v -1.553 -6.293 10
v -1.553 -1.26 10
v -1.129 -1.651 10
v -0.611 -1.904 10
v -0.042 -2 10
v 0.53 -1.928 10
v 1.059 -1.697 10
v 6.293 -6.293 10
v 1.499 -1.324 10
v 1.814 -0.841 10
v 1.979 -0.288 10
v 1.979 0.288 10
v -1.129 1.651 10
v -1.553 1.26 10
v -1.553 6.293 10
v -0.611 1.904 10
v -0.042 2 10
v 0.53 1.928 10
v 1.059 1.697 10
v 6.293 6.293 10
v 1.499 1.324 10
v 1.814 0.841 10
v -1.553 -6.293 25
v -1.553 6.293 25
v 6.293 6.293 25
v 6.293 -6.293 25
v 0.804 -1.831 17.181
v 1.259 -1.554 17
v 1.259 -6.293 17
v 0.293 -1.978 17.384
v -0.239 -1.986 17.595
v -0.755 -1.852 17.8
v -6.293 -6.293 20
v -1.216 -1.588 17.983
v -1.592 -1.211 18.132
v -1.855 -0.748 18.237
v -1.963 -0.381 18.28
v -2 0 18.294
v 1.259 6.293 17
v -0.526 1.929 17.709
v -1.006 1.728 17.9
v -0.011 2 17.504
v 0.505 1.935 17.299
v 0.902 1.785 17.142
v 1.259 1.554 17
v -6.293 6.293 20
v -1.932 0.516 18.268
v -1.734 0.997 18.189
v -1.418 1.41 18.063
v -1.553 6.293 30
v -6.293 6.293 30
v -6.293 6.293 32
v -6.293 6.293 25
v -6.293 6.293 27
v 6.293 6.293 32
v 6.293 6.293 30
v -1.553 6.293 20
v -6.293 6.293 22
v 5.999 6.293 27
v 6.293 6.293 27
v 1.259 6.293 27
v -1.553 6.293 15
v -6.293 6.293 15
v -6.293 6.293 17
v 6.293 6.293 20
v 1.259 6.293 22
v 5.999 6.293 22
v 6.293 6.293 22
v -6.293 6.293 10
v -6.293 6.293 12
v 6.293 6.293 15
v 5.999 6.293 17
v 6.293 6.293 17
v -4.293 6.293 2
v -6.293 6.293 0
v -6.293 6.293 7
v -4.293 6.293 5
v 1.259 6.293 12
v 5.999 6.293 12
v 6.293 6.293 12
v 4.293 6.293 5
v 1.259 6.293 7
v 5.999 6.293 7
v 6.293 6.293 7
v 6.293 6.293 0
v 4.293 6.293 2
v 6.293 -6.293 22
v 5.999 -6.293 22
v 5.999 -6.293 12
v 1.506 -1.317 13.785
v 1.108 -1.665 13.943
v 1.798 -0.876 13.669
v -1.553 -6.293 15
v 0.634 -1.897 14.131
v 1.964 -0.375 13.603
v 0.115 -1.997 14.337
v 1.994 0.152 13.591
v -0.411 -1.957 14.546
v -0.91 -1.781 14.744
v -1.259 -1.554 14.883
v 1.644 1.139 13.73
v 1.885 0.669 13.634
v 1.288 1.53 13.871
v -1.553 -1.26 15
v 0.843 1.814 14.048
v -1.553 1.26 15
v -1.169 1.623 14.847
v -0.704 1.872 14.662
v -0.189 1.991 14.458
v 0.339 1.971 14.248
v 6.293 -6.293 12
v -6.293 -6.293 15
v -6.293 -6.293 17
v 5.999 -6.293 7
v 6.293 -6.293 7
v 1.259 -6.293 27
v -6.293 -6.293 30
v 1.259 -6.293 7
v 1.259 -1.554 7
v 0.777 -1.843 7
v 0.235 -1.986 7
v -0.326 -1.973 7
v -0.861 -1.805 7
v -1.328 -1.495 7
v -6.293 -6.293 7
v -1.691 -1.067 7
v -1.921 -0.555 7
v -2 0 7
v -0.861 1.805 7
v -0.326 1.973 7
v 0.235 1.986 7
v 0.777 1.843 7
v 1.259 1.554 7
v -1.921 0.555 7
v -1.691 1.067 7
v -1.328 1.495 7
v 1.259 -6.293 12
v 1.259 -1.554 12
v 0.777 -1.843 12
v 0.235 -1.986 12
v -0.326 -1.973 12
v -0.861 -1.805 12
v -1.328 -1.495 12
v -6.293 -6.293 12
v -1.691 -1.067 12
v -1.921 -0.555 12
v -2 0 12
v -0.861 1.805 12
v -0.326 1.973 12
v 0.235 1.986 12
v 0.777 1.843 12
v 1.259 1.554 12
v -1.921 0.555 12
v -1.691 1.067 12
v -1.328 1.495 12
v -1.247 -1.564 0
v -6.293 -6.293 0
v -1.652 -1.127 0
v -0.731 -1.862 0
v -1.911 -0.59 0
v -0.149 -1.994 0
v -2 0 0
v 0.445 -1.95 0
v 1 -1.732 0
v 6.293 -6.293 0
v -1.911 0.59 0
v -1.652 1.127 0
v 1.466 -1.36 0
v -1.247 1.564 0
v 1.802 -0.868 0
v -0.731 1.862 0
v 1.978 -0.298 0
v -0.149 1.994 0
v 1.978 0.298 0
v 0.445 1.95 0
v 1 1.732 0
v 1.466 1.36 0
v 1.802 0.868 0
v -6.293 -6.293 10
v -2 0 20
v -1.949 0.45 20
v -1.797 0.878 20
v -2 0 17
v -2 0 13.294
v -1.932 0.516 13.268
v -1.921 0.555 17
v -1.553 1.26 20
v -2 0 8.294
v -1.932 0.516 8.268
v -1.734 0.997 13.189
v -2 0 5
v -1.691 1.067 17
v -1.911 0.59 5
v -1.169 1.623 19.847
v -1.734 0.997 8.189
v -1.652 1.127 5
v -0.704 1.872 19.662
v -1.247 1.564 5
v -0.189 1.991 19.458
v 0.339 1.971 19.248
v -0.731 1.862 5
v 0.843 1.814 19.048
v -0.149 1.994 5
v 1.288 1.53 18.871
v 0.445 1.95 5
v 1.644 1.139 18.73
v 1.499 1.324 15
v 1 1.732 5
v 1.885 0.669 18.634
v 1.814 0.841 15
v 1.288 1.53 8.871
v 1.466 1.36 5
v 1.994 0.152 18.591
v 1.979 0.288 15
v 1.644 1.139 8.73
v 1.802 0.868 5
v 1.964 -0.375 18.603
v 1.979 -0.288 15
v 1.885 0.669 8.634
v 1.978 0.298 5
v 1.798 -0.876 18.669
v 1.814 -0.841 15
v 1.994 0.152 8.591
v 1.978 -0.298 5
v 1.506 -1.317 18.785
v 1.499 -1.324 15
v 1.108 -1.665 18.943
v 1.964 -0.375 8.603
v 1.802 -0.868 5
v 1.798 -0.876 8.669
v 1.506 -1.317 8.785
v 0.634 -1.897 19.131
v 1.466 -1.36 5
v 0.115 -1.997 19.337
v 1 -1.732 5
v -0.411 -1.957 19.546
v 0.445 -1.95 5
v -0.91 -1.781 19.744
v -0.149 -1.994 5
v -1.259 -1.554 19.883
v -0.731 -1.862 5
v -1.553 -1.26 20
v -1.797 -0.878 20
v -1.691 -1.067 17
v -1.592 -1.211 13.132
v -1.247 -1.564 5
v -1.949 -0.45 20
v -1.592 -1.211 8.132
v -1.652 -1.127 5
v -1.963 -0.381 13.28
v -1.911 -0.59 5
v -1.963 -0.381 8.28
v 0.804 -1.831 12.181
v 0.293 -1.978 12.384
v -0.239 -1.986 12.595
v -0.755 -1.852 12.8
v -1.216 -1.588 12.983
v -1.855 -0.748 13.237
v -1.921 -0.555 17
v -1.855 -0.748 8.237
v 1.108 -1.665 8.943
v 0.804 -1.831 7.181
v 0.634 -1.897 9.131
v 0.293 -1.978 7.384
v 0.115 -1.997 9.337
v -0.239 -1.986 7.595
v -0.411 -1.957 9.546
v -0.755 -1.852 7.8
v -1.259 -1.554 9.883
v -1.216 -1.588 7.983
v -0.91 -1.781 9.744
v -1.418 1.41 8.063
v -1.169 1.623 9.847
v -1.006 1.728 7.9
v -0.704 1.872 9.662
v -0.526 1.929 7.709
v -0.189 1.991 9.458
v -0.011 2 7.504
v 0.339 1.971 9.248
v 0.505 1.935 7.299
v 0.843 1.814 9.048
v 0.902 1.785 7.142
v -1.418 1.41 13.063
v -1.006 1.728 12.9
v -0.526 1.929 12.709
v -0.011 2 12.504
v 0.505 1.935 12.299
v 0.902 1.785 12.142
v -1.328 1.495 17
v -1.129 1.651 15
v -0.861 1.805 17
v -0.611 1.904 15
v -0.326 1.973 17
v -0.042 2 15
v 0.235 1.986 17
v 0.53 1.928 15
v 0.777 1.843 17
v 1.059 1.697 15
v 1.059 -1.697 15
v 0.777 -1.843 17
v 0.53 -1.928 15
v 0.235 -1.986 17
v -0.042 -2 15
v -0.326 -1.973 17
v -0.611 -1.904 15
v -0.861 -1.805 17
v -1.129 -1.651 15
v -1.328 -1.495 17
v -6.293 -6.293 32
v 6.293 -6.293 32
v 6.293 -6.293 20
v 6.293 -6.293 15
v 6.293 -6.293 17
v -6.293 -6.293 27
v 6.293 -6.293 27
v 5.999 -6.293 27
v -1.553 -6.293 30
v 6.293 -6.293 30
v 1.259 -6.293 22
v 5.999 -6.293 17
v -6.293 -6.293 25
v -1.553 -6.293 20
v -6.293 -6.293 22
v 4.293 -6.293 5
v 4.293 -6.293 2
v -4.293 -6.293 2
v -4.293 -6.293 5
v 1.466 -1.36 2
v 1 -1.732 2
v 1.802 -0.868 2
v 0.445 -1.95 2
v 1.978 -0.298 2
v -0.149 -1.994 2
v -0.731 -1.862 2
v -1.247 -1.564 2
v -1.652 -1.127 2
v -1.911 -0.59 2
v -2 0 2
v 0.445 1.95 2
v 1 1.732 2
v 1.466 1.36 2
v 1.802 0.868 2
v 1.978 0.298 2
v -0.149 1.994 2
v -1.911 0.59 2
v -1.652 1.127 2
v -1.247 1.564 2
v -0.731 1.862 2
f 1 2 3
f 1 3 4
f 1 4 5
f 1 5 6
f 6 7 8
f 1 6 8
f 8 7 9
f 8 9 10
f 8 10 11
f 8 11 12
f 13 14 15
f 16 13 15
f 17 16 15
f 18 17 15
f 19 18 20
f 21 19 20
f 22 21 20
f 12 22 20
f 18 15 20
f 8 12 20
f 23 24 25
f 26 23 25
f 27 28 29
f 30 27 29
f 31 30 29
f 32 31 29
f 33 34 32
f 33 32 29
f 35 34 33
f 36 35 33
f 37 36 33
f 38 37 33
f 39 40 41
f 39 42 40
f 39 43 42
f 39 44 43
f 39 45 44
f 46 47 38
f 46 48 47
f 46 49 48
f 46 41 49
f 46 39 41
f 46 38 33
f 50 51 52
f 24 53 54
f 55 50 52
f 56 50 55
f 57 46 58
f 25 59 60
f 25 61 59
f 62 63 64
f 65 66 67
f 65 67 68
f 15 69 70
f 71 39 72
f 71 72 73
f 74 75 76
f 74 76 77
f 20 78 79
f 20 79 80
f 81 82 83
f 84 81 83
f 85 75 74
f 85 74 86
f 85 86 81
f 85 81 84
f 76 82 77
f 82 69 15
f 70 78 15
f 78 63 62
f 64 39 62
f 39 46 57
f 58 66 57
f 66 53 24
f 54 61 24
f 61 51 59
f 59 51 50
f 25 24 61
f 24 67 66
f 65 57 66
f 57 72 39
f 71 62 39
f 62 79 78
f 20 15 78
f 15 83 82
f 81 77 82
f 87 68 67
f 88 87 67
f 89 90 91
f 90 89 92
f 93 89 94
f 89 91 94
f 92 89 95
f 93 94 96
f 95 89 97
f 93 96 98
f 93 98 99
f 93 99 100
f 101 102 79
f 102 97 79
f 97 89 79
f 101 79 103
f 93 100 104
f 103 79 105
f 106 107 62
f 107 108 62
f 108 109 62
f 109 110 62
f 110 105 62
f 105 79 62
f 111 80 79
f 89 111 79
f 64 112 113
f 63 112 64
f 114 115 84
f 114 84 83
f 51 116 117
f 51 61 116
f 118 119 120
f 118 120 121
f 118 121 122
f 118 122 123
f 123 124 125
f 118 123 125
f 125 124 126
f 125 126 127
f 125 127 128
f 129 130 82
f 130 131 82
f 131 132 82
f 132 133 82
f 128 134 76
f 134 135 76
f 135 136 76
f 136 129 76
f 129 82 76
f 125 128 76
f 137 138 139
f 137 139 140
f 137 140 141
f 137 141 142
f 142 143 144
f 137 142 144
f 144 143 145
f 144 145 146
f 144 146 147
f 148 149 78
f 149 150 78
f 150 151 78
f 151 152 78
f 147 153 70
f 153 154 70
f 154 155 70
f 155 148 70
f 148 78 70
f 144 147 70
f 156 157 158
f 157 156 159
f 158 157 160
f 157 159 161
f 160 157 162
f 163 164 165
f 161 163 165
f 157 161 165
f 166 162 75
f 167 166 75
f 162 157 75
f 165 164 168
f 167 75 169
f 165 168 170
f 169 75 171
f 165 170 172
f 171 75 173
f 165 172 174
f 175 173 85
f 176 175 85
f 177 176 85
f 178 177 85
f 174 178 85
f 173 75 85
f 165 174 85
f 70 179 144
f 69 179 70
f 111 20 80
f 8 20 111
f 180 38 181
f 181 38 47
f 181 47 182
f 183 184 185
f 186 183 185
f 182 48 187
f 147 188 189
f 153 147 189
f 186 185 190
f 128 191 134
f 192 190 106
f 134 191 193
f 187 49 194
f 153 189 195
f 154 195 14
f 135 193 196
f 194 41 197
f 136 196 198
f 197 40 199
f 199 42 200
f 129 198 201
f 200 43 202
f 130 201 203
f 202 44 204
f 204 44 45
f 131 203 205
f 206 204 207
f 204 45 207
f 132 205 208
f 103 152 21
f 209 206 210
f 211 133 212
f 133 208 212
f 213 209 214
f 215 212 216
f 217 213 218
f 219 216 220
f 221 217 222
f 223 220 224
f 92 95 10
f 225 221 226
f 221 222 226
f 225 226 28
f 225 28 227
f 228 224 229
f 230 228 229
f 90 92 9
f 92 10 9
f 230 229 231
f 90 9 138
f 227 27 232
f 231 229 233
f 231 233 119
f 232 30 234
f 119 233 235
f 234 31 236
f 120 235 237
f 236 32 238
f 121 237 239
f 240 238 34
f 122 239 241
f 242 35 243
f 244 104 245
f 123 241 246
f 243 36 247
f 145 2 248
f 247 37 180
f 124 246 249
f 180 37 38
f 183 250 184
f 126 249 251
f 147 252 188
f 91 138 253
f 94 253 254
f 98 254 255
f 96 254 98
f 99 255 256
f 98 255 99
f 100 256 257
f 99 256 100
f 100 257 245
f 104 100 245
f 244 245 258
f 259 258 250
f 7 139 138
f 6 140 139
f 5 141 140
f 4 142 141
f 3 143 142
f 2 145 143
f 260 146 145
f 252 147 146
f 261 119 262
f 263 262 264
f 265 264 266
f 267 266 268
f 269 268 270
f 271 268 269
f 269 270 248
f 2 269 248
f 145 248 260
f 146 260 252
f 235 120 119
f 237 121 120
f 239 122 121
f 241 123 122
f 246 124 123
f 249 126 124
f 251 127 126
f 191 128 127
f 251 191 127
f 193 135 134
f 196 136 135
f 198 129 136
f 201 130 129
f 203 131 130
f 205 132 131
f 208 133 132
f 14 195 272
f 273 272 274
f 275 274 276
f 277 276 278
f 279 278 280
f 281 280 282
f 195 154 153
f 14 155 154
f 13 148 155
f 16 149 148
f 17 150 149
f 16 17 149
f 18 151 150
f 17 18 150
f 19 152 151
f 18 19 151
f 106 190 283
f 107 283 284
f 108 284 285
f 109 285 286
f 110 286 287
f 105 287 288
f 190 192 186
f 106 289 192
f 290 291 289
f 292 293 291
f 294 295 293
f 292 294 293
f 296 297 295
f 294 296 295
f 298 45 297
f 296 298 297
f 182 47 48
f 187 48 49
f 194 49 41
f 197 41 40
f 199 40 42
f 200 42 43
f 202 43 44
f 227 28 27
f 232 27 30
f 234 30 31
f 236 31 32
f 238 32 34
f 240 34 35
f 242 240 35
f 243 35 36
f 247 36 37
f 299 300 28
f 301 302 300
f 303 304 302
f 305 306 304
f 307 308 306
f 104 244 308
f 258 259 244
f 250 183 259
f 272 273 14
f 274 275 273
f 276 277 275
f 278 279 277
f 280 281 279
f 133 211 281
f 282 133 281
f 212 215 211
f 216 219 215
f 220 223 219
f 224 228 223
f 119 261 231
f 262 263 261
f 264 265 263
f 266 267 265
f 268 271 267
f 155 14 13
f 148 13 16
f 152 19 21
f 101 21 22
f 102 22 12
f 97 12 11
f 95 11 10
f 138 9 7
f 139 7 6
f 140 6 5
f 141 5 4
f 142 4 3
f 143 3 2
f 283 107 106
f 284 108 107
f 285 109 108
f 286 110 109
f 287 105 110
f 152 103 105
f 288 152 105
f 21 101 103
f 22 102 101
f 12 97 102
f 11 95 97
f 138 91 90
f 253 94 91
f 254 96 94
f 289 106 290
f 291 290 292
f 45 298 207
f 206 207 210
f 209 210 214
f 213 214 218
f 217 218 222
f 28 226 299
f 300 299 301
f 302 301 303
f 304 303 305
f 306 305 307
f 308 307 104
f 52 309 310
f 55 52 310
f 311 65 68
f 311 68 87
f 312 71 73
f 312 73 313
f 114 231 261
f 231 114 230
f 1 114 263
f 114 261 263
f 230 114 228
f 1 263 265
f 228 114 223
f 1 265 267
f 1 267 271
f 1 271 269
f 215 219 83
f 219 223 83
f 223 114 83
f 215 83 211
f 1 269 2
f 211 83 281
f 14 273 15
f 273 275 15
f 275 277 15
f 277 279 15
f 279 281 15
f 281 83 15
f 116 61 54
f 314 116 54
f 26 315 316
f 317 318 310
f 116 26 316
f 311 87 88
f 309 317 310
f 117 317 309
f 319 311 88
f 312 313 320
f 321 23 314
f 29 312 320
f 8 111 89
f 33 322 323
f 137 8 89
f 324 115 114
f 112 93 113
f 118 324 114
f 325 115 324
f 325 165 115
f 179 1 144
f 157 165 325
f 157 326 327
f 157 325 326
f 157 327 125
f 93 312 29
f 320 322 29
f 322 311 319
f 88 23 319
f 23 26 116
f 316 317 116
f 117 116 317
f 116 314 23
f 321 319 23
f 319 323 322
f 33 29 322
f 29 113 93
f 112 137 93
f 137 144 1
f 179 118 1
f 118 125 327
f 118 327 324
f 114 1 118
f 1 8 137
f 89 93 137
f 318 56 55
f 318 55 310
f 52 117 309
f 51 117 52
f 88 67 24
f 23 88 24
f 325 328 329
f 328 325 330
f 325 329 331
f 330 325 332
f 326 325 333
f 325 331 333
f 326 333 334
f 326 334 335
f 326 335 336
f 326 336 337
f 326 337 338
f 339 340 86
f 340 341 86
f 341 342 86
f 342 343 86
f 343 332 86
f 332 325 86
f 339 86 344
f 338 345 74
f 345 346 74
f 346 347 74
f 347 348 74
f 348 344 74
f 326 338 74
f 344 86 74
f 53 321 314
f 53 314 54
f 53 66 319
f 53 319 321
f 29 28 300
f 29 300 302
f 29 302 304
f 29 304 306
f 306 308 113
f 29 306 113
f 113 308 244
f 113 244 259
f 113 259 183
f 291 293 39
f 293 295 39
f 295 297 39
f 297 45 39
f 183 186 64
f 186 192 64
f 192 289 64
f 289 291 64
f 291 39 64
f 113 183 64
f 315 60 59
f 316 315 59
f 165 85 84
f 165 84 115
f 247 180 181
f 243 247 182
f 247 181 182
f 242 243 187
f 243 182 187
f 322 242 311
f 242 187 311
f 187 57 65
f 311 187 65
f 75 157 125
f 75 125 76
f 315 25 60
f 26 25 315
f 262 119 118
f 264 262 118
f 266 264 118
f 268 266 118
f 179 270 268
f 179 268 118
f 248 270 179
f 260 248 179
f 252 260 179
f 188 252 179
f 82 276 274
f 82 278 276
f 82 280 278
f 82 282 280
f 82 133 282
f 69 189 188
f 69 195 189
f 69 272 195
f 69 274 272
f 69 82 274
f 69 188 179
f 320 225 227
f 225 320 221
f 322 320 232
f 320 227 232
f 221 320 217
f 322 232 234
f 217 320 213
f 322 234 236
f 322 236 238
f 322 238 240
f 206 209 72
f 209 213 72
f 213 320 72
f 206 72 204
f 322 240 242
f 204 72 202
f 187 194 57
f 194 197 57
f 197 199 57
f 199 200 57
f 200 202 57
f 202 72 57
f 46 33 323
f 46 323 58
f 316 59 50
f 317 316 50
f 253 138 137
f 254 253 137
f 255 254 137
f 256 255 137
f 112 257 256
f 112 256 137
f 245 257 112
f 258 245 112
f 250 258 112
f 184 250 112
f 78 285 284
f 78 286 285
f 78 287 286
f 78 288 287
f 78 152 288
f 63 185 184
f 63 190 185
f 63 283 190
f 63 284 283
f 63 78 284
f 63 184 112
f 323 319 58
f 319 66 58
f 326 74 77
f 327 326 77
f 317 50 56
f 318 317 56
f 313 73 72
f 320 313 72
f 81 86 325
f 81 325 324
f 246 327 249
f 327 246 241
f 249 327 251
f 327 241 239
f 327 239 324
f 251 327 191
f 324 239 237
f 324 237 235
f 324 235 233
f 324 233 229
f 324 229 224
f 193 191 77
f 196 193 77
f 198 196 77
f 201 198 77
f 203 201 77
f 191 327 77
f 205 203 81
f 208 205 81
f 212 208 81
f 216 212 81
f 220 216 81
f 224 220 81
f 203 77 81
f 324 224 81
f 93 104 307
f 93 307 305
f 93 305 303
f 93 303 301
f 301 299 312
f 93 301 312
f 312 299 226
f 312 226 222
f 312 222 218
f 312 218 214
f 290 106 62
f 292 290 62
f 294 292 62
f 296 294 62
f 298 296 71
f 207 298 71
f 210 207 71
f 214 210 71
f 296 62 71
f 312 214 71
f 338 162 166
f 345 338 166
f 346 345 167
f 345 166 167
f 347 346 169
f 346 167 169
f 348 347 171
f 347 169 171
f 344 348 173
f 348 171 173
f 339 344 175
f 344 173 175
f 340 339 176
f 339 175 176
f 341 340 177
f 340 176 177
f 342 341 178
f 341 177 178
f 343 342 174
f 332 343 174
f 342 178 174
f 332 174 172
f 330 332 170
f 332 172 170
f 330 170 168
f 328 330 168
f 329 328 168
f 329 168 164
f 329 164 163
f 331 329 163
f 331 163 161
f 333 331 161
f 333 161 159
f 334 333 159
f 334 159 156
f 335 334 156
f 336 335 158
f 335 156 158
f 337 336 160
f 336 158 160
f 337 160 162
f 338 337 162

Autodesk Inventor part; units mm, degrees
ref_plane "YZ Plane" through (0, 0, 0) normal (1, 0, 0) x (0, 1, 0)
ref_plane "XZ Plane" through (0, 0, 0) normal (0, 1, 0) x (-1, 0, 0)
ref_plane "XY Plane" through (0, 0, 0) normal (0, 0, 1) x (1, 0, 0)
sketch "Boceto1" plane through (0, 0, 0) normal (0, 0, 1) x (1, 0, 0)
  circle A0 centre (0, 0) radius 8.9
  line L0 (6.2933, -6.2933) -> (-6.2933, -6.2933)
  line L1 (-6.2933, -6.2933) -> (-6.2933, 6.2933)
  line L2 (-6.2933, 6.2933) -> (6.2933, 6.2933)
  line L3 (6.2933, 6.2933) -> (6.2933, -6.2933)
  dimension "d0" = 17.8
  dimension "d1" = 12.5865
  dimension "d2" = 12.5865
extrude "Extrusión1" add sketch "Boceto1" along normal blind 32 contours L3 L0 L1 L2
sketch "Boceto2" plane through (0, 0, 0) normal (0, 1, 0) x (-1, 0, 0)
  line L0 (6.2933, 0) -> (-6.2933, 0)
  line L1 (-6.2933, 0) -> (-6.2933, 2)
  line L2 (-6.2933, 2) -> (6.2933, 2)
  line L3 (6.2933, 2) -> (6.2933, 0)
  line L4 (6.2933, 5) -> (-6.2933, 5)
  line L5 (-6.2933, 5) -> (-6.2933, 7)
  line L6 (-6.2933, 7) -> (6.2933, 7)
  line L7 (6.2933, 7) -> (6.2933, 5)
  line L8 (6.2933, 10) -> (-6.2933, 10)
  line L9 (-6.2933, 10) -> (-6.2933, 12)
  line L10 (-6.2933, 12) -> (6.2933, 12)
  line L11 (6.2933, 12) -> (6.2933, 10)
  line L12 (6.2933, 15) -> (-6.2933, 15)
  line L13 (-6.2933, 15) -> (-6.2933, 17)
  line L14 (-6.2933, 17) -> (6.2933, 17)
  line L15 (6.2933, 17) -> (6.2933, 15)
  line L16 (6.2933, 20) -> (-6.2933, 20)
  line L17 (-6.2933, 20) -> (-6.2933, 22)
  line L18 (-6.2933, 22) -> (6.2933, 22)
  line L19 (6.2933, 22) -> (6.2933, 20)
  line L20 (6.2933, 25) -> (-6.2933, 25)
  line L21 (-6.2933, 25) -> (-6.2933, 27)
  line L22 (-6.2933, 27) -> (6.2933, 27)
  line L23 (6.2933, 27) -> (6.2933, 25)
  line L24 (6.2933, 30) -> (-6.2933, 30)
  line L25 (-6.2933, 30) -> (-6.2933, 32)
  line L26 (-6.2933, 32) -> (6.2933, 32)
  line L27 (6.2933, 32) -> (6.2933, 30)
  line L28 (-6.2933, 0) -> (6.2933, 0) projected
  line L29 (-6.2933, 0) -> (6.2933, 5)
  line L30 (-6.2933, 1.883) -> (6.2933, 6.883)
  line L31 (-6.2933, 6.883) -> (6.2933, 11.883)
  line L32 (-6.2933, 5) -> (6.2933, 10)
  line L33 (-6.2933, 11.883) -> (6.2933, 16.883)
  line L34 (-6.2933, 10) -> (6.2933, 15)
  line L35 (-6.2933, 16.883) -> (6.2933, 21.883)
  line L36 (-6.2933, 15) -> (6.2933, 20)
  line L37 (-6.2933, 21.883) -> (6.2933, 26.883)
  line L38 (-6.2933, 20) -> (6.2933, 25)
  line L39 (-6.2933, 26.883) -> (6.2933, 31.883)
  line L40 (-6.2933, 25) -> (6.2933, 30)
  line L41 (6.2933, 0) -> (4.2933, 0)
  line L42 (4.2933, 0) -> (4.2933, 7)
  line L43 (4.2933, 7) -> (6.2933, 7)
  line L44 (6.2933, 7) -> (6.2933, 0)
  line L45 (-6.2933, 0) -> (-4.2933, 0)
  line L46 (-4.2933, 0) -> (-4.2933, 7)
  line L47 (-4.2933, 7) -> (-6.2933, 7)
  line L48 (-6.2933, 7) -> (-6.2933, 0)
  point P0 (0, 0)
  point P1 (0, 5)
  point P2 (0, 10)
  point P3 (0, 15)
  point P4 (0, 20)
  point P5 (0, 25)
  point P6 (0, 30)
  point P7 (1.5531, 30)
  point P8 (-5.9988, 27)
  point P9 (1.5531, 25)
  point P10 (-5.9988, 22)
  point P11 (1.5531, 20)
  point P12 (-5.9988, 17)
  point P13 (1.5531, 15)
  point P14 (-5.9988, 12)
  point P15 (1.5531, 10)
  point P16 (-5.9988, 7)
  point P17 (1.5531, 5)
  point P18 (-5.9988, 2)
  point P19 (-1.2586, 2)
  point P20 (-1.2587, 7)
  point P21 (-1.2587, 12)
  point P22 (-1.2587, 17)
  point P23 (-1.2586, 22)
  point P24 (-1.2586, 27)
  point P25 (4.2933, 5)
  point P26 (4.2933, 2)
  point P27 (-4.2933, 2)
  point P28 (-4.2933, 5)
  dimension "d5" = 2
  dimension "d8" = 5
  dimension "d13" = 1.75
  dimension "d16" = 5
  dimension "d23" = 2
  dimension "d24" = 2
extrude "Extrusión2" cut sketch "Boceto2" against normal mid plane 30 contours L0 L42 L2 L3 | L0 L46 L29 L2 L42 | L2 L42 L29 L44 | L0 L29 L46 | L29 L42 L4 | L4 L42 L30 L7 | L1 L30 L2 L46 L29 | L46 L2 L29 | L4 L30 L42 | L30 L42 L6 L7 | L1 L2 L30 | L2 L30 L46 | L4 L46 L32 L6 L42 L30 | L48 L4 L46 L30 L2 | L4 L32 L46 | L5 L31 L6 L46 L32 | L46 L6 L32 | L6 L31 L8 L32 | L5 L6 L31 | L8 L31 L11 | L8 L34 L10 L11 L31 | L9 L33 L10 L34 | L9 L10 L33 | L10 L33 L12 L34 | L12 L33 L15 | L12 L36 L14 L15 L33 | L13 L35 L14 L36 | L13 L14 L35 | L14 L35 L16 L36 | L16 L35 L19 | L16 L38 L18 L19 L35 | L17 L37 L18 L38 | L17 L18 L37 | L18 L37 L20 L38 | L20 L37 L23 | L20 L40 L22 L23 L37 | L21 L39 L22 L40 | L21 L22 L39 | L22 L39 L24 L40 | L24 L39 L27 | L24 L25 L26 L27 L39 keep common part
sketch "Boceto3" plane through (0, 0, 0) normal (0, 0, -1) x (-1, 0, 0)
  circle A0 centre (0, 0) radius 2
  dimension "d25" = 4
extrude "Extrusión3" cut sketch "Boceto3" against normal blind 20
properties part number "_3DPrint"
